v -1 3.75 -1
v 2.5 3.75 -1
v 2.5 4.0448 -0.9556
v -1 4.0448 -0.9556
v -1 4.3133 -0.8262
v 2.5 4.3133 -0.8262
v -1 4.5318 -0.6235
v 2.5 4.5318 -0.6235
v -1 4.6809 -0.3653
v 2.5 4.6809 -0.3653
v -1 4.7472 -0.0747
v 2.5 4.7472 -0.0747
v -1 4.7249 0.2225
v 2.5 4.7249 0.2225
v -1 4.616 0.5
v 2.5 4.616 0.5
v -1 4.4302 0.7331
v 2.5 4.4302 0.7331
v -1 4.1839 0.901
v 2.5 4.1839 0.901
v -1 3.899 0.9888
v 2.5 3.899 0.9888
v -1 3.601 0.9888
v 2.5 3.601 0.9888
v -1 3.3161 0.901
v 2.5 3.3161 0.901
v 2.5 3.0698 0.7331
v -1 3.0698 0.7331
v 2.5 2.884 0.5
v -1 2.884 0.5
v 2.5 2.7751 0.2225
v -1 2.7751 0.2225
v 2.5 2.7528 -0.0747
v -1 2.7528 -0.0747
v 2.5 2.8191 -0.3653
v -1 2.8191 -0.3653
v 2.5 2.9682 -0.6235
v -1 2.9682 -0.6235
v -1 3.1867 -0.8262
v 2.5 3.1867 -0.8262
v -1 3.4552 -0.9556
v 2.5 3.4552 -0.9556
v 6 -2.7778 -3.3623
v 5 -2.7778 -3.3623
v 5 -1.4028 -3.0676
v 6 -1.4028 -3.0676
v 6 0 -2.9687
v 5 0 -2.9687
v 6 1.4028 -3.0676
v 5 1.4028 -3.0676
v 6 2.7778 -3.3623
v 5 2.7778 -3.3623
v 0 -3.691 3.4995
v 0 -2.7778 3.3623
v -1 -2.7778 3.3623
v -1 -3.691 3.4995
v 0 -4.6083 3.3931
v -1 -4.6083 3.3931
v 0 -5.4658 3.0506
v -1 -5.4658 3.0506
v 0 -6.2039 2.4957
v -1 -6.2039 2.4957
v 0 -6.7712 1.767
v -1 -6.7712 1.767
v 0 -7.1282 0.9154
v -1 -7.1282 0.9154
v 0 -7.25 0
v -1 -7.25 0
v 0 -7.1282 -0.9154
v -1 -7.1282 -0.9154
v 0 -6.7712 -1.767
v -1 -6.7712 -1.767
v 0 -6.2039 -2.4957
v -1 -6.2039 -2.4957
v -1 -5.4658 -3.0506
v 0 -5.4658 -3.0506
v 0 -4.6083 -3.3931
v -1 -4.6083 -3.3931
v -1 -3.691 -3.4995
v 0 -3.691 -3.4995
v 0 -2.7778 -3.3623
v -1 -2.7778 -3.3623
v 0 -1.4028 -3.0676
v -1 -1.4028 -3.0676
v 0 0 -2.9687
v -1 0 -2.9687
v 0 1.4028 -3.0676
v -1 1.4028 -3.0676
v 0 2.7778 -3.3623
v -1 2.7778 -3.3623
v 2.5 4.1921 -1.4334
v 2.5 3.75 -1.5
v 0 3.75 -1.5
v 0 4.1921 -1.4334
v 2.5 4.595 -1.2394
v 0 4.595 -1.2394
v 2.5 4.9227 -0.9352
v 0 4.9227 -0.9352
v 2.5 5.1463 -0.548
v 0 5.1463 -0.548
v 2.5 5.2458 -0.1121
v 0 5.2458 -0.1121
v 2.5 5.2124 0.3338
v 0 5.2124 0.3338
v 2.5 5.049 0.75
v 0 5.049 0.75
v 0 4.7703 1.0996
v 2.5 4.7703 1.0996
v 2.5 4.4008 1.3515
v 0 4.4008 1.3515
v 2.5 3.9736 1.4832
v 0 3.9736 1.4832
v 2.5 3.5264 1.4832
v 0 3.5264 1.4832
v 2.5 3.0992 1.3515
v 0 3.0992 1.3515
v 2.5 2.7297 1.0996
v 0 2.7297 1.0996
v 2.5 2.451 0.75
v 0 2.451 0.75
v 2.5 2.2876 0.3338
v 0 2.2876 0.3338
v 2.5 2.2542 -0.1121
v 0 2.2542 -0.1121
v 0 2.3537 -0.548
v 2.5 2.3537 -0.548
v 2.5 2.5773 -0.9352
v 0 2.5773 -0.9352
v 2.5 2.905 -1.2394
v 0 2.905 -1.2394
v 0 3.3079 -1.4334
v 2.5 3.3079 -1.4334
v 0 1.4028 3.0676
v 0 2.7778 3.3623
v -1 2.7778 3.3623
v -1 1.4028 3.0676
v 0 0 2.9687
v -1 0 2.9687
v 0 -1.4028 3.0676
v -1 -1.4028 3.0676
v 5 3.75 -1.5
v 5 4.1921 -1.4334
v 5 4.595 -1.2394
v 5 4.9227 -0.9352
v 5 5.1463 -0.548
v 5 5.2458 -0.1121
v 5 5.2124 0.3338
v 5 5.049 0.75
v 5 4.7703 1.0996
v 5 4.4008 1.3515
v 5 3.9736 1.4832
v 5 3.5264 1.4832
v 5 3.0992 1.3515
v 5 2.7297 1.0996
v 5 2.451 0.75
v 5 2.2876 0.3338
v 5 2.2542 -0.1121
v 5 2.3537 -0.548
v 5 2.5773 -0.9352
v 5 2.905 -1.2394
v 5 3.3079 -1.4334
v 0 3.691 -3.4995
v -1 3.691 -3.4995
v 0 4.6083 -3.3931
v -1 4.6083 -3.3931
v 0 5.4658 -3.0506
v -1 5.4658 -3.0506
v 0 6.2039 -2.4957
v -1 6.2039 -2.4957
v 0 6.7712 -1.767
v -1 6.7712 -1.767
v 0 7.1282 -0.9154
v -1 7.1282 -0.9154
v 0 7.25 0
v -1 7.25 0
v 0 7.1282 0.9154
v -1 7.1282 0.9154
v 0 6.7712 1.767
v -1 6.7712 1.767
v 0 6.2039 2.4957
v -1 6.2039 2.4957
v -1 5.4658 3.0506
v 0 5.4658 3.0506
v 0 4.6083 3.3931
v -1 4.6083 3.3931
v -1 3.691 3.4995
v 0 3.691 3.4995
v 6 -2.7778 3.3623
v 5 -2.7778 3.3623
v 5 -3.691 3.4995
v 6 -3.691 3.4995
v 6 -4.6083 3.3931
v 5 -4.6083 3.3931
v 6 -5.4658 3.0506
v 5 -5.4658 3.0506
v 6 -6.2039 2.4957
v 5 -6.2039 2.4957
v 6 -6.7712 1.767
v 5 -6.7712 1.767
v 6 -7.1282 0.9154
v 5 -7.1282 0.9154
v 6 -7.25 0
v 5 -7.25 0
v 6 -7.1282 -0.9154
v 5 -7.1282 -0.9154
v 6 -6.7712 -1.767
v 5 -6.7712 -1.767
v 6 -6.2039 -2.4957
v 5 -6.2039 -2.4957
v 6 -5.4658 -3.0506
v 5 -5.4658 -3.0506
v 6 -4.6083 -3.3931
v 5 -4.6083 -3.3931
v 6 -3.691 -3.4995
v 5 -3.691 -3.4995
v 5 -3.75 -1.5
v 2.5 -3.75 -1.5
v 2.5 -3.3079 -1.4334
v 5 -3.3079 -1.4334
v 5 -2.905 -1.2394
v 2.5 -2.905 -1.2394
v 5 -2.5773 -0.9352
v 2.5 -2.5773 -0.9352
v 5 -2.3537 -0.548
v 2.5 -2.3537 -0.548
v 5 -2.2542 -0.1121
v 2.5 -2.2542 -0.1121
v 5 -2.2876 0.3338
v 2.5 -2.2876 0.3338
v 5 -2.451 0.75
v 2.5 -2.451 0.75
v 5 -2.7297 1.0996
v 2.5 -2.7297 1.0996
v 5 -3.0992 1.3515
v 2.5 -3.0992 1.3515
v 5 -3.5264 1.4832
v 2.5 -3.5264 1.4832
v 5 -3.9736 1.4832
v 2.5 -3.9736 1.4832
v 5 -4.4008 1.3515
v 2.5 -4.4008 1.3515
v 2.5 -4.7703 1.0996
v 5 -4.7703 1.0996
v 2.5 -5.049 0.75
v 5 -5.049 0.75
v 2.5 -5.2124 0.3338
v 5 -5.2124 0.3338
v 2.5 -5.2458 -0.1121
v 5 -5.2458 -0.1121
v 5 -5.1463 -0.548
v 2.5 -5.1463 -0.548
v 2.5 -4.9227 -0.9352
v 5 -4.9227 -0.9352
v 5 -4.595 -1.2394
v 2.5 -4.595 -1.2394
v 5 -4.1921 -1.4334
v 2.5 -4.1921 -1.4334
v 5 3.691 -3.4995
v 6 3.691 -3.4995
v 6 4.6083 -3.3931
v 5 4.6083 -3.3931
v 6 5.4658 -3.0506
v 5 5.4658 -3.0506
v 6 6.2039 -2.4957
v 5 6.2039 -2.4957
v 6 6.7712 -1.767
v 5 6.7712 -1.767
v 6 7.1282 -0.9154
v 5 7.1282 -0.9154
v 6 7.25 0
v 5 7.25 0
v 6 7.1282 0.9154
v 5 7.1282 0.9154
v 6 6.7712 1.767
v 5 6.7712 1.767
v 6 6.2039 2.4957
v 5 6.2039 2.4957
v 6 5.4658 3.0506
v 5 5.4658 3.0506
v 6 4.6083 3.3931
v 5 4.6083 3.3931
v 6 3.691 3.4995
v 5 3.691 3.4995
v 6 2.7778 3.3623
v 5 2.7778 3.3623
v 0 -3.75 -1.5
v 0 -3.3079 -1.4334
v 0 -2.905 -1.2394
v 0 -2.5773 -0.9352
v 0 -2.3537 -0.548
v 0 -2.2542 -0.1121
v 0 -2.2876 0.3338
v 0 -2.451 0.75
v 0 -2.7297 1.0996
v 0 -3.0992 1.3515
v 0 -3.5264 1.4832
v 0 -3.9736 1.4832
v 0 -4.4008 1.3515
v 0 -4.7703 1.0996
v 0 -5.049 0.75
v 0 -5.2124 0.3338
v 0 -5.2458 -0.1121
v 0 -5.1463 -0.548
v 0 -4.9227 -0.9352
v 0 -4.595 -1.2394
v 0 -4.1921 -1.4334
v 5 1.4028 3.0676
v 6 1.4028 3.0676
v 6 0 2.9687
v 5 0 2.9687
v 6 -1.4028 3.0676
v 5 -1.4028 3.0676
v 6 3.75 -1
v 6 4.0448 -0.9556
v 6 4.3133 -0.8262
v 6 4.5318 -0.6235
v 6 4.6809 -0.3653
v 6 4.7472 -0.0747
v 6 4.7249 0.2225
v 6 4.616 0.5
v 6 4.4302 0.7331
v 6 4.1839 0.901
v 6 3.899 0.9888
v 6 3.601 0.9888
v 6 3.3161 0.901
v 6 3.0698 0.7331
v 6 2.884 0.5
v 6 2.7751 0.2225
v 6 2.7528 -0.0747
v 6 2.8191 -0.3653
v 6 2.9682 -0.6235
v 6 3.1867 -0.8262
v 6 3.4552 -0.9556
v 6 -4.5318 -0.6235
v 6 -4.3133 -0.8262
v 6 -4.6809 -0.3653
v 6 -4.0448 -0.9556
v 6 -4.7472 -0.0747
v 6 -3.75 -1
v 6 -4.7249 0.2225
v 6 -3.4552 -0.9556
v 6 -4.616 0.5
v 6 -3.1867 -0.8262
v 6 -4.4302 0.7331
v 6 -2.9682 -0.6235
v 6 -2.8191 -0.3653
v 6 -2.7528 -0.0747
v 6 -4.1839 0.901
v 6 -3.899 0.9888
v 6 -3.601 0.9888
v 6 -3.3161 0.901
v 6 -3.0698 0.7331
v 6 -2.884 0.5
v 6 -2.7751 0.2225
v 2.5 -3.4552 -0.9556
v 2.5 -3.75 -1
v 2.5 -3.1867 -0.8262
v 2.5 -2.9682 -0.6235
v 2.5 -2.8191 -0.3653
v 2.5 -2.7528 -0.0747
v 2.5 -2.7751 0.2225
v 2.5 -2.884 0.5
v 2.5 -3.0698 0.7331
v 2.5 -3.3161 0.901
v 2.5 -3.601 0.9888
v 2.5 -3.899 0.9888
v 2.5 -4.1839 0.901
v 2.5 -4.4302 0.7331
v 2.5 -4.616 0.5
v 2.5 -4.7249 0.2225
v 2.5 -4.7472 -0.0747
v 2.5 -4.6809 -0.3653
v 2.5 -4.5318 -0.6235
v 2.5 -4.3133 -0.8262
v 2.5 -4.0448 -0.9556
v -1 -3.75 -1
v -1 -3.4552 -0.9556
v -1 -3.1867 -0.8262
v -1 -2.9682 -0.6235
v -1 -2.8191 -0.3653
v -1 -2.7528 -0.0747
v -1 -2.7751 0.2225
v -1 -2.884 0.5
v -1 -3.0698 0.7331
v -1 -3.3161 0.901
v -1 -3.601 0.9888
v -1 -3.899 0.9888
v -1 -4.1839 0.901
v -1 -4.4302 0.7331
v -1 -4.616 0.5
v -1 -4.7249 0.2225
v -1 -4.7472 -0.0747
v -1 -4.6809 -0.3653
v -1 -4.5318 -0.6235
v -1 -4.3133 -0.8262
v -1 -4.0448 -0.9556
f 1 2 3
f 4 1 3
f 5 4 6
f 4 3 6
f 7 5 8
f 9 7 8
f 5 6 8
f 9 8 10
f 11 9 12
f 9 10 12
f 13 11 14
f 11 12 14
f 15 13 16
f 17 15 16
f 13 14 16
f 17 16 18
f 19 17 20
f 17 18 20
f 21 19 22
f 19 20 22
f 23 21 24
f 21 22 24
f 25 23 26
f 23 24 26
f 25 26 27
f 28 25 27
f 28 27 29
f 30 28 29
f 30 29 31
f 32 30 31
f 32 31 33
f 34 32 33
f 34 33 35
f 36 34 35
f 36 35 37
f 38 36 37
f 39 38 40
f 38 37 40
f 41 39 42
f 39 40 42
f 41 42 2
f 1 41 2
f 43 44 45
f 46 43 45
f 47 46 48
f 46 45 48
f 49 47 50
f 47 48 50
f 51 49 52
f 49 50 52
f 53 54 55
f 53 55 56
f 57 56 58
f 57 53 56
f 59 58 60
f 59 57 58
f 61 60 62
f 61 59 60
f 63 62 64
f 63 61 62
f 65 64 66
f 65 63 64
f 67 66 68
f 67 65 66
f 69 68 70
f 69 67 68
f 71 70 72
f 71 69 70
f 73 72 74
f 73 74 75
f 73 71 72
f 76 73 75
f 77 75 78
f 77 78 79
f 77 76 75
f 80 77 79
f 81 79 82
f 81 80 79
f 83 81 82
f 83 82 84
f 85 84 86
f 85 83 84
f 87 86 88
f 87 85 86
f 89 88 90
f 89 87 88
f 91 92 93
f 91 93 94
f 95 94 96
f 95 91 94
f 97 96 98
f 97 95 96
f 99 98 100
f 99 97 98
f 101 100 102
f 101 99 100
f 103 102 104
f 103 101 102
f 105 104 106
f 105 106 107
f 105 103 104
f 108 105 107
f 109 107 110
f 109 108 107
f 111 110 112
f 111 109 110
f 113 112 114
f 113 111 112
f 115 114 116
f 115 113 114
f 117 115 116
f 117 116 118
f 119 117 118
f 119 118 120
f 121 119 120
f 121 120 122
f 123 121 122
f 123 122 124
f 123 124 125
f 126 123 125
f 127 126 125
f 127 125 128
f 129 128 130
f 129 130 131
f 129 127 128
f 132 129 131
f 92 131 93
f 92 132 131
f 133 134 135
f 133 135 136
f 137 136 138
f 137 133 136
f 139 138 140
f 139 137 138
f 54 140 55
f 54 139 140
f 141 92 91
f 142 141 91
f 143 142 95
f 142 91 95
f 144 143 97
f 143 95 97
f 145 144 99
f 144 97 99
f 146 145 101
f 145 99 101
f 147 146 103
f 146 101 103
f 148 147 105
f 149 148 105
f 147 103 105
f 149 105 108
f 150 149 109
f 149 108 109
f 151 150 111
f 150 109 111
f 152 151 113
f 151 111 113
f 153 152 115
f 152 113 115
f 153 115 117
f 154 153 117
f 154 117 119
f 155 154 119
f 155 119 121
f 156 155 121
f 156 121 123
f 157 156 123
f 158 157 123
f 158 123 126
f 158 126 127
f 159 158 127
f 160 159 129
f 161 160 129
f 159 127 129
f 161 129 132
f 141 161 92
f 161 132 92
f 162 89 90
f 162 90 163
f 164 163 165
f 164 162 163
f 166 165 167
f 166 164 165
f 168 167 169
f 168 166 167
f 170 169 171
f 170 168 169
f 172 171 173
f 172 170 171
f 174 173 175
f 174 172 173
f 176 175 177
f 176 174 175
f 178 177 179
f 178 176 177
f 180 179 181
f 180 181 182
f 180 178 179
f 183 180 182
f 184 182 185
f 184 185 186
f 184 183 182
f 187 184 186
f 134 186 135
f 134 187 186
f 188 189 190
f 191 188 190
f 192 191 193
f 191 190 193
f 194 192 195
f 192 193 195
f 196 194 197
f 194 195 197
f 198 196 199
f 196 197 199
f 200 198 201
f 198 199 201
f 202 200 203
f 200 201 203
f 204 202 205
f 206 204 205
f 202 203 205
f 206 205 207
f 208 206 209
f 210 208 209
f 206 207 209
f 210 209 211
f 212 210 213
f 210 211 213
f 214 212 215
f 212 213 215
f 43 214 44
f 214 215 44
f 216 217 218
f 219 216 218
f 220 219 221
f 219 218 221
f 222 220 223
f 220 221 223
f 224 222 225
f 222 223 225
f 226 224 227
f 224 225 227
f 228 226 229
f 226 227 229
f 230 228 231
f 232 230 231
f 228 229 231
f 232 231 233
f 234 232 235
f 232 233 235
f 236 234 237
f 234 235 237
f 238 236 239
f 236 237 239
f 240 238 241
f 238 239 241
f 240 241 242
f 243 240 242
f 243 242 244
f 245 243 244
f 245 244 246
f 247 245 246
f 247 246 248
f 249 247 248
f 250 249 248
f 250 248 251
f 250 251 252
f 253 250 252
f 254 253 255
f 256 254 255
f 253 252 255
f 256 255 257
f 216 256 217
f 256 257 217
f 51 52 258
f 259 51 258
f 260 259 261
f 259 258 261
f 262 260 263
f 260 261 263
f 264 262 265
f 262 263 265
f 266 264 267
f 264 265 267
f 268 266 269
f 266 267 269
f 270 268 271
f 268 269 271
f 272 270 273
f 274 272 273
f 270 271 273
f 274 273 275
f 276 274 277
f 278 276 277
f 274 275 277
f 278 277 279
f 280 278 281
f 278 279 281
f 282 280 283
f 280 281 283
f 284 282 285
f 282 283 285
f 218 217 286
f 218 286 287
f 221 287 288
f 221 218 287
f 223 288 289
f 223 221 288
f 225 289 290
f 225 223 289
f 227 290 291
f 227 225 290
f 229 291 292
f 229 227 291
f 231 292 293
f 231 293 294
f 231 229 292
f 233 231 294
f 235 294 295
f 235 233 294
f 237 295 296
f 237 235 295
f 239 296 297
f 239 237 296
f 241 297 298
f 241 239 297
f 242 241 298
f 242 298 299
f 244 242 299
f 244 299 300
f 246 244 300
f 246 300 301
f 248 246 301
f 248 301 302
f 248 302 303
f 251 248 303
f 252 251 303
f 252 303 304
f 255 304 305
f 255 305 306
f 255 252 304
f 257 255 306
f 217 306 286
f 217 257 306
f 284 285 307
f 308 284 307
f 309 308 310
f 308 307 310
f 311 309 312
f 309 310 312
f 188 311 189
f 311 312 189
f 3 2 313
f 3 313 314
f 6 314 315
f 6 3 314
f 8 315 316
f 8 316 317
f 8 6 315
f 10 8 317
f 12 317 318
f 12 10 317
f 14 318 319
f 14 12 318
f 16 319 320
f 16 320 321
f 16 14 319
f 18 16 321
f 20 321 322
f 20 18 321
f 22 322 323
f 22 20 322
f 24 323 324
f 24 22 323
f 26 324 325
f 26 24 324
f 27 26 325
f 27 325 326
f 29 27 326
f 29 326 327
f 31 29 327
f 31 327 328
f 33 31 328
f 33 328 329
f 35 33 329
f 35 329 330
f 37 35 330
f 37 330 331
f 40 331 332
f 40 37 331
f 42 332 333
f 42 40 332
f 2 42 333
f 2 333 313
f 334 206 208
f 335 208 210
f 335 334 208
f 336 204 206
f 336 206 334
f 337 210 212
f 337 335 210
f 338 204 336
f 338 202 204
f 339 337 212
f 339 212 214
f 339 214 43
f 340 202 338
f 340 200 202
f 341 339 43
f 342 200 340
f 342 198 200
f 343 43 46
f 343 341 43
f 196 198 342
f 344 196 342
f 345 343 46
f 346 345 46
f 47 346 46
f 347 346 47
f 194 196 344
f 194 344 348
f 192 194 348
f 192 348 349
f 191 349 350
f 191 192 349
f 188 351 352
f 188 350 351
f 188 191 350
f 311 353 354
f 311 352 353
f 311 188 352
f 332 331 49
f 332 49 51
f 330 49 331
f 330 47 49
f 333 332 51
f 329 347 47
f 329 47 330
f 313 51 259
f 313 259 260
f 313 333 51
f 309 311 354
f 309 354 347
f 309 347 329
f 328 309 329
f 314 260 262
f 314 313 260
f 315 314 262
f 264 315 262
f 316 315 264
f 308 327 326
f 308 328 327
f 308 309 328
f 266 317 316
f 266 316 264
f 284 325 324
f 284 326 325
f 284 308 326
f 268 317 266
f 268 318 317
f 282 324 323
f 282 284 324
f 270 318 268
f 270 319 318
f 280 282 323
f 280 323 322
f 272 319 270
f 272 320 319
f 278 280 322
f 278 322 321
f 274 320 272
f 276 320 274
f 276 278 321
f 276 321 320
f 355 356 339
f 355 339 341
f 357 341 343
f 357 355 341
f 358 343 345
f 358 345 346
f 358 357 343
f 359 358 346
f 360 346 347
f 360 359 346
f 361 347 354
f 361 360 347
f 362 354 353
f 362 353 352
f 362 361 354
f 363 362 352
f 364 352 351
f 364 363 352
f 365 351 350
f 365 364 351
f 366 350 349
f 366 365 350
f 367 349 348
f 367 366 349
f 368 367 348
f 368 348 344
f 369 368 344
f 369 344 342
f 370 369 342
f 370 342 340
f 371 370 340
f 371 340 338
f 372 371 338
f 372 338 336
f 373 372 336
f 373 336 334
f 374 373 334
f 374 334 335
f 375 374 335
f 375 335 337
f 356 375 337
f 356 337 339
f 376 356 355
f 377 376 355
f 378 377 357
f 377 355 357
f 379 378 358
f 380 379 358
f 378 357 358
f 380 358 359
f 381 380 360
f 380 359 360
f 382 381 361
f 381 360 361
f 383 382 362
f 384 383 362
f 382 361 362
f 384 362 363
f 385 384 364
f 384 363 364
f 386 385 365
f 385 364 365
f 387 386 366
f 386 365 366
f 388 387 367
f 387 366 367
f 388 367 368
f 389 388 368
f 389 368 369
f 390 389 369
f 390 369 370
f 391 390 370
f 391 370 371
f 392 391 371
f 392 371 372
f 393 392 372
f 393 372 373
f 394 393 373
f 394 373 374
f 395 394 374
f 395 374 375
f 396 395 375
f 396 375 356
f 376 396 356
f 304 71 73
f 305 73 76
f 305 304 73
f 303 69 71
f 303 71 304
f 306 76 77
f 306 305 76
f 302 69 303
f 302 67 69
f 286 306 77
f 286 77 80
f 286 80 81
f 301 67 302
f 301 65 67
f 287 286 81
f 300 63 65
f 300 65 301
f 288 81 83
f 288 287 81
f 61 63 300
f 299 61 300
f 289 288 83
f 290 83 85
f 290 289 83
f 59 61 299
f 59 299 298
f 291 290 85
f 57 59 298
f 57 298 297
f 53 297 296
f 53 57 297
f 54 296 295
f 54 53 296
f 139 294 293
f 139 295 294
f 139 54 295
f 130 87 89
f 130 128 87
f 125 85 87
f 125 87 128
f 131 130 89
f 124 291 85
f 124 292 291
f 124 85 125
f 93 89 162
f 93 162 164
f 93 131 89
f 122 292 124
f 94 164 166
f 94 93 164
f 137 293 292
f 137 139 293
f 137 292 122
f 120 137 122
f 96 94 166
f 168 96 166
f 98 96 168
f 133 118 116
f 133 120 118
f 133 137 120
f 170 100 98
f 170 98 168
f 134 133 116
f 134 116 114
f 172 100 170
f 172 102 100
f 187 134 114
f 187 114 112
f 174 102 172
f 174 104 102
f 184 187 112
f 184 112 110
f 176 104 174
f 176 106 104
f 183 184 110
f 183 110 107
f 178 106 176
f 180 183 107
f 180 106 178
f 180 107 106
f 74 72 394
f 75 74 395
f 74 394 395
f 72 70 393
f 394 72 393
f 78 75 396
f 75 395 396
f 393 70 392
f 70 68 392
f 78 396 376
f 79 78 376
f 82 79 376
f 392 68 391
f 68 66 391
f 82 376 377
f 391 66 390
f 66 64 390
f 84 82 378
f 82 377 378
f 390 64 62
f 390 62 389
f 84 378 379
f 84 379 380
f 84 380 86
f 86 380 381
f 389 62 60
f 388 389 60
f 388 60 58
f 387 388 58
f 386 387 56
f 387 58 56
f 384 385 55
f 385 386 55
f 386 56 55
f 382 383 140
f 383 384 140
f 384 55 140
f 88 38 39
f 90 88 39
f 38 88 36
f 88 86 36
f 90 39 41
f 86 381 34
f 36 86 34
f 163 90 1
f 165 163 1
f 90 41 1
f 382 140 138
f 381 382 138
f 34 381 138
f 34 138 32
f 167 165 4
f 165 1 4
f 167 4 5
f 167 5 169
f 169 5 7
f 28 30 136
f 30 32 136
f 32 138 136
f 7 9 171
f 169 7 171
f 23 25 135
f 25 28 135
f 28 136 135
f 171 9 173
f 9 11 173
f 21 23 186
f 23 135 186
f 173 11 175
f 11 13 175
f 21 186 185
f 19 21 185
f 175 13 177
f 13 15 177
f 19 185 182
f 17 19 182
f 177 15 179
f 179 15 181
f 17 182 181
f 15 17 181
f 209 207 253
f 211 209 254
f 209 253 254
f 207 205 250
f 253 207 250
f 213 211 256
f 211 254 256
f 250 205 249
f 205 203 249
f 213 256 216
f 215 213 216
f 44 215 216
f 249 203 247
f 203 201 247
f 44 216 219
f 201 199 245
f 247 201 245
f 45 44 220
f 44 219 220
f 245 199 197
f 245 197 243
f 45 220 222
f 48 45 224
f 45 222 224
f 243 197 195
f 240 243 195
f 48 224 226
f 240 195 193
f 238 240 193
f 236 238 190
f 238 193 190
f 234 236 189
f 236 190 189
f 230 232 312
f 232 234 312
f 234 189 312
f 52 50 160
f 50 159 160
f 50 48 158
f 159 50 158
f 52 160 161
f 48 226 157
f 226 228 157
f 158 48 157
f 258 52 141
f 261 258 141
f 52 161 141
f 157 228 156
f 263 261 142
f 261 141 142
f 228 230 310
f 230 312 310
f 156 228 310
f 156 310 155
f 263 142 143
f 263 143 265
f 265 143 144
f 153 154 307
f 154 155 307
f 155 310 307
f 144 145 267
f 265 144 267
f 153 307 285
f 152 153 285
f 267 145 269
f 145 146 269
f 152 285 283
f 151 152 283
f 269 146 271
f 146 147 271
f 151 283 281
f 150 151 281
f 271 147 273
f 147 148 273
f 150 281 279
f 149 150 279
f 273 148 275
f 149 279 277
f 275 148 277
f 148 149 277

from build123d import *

# Parameters (mm, degrees)
SKETCH2_R           = 1
BOSS_EXTRUDE1_DEPTH = 1
BOSS_EXTRUDE2_START = 2.5
SKETCH2_3_R         = 1.5
SKETCH2_3_R_2       = 1
BOSS_EXTRUDE2_DEPTH = 2.5


with BuildPart() as part:
    # Sketch2 → Boss-Extrude1 (new body)
    with BuildSketch(Plane.YZ):
        with BuildLine():
            ThreePointArc((-2.777777778, 3.362258757), (-7.25, 0), (-2.777777778, -3.362258757))
            ThreePointArc((-2.777777778, -3.362258757), (0, -2.968712349), (2.777777778, -3.362258757))
            ThreePointArc((2.777777778, -3.362258757), (7.25, 0), (2.777777778, 3.362258757))
            ThreePointArc((2.777777778, 3.362258757), (0, 2.968712349), (-2.777777778, 3.362258757))
        make_face()
        with Locations((-3.75, 0)):
            Circle(SKETCH2_R, mode=Mode.SUBTRACT)
        with Locations((3.75, 0)):
            Circle(SKETCH2_R, mode=Mode.SUBTRACT)
    extrude(amount=-BOSS_EXTRUDE1_DEPTH)

    # Sketch2<3> → Boss-Extrude2 (add)
    # profile 1 of 2: a face of its own
    with BuildSketch(Plane.YZ.offset(BOSS_EXTRUDE2_START)):
        with Locations((-3.75, 0)):
            Circle(SKETCH2_3_R)
        with Locations((-3.75, 0)):
            Circle(SKETCH2_3_R_2, mode=Mode.SUBTRACT)
    # profile 2 of 2: a face of its own
    with BuildSketch(Plane.YZ.offset(BOSS_EXTRUDE2_START)):
        with Locations((3.75, 0)):
            Circle(SKETCH2_3_R)
        with Locations((3.75, 0)):
            Circle(SKETCH2_3_R_2, mode=Mode.SUBTRACT)
    extrude(amount=-BOSS_EXTRUDE2_DEPTH)

    # Mirror1: part across plane


with BuildPart() as part_1:
    add(part.part)
    add(part.part.mirror(Plane(origin=(2.5, 0, 0), x_dir=(0, 0, 1), z_dir=(1, 0, 0))))


solid = part_1.part
